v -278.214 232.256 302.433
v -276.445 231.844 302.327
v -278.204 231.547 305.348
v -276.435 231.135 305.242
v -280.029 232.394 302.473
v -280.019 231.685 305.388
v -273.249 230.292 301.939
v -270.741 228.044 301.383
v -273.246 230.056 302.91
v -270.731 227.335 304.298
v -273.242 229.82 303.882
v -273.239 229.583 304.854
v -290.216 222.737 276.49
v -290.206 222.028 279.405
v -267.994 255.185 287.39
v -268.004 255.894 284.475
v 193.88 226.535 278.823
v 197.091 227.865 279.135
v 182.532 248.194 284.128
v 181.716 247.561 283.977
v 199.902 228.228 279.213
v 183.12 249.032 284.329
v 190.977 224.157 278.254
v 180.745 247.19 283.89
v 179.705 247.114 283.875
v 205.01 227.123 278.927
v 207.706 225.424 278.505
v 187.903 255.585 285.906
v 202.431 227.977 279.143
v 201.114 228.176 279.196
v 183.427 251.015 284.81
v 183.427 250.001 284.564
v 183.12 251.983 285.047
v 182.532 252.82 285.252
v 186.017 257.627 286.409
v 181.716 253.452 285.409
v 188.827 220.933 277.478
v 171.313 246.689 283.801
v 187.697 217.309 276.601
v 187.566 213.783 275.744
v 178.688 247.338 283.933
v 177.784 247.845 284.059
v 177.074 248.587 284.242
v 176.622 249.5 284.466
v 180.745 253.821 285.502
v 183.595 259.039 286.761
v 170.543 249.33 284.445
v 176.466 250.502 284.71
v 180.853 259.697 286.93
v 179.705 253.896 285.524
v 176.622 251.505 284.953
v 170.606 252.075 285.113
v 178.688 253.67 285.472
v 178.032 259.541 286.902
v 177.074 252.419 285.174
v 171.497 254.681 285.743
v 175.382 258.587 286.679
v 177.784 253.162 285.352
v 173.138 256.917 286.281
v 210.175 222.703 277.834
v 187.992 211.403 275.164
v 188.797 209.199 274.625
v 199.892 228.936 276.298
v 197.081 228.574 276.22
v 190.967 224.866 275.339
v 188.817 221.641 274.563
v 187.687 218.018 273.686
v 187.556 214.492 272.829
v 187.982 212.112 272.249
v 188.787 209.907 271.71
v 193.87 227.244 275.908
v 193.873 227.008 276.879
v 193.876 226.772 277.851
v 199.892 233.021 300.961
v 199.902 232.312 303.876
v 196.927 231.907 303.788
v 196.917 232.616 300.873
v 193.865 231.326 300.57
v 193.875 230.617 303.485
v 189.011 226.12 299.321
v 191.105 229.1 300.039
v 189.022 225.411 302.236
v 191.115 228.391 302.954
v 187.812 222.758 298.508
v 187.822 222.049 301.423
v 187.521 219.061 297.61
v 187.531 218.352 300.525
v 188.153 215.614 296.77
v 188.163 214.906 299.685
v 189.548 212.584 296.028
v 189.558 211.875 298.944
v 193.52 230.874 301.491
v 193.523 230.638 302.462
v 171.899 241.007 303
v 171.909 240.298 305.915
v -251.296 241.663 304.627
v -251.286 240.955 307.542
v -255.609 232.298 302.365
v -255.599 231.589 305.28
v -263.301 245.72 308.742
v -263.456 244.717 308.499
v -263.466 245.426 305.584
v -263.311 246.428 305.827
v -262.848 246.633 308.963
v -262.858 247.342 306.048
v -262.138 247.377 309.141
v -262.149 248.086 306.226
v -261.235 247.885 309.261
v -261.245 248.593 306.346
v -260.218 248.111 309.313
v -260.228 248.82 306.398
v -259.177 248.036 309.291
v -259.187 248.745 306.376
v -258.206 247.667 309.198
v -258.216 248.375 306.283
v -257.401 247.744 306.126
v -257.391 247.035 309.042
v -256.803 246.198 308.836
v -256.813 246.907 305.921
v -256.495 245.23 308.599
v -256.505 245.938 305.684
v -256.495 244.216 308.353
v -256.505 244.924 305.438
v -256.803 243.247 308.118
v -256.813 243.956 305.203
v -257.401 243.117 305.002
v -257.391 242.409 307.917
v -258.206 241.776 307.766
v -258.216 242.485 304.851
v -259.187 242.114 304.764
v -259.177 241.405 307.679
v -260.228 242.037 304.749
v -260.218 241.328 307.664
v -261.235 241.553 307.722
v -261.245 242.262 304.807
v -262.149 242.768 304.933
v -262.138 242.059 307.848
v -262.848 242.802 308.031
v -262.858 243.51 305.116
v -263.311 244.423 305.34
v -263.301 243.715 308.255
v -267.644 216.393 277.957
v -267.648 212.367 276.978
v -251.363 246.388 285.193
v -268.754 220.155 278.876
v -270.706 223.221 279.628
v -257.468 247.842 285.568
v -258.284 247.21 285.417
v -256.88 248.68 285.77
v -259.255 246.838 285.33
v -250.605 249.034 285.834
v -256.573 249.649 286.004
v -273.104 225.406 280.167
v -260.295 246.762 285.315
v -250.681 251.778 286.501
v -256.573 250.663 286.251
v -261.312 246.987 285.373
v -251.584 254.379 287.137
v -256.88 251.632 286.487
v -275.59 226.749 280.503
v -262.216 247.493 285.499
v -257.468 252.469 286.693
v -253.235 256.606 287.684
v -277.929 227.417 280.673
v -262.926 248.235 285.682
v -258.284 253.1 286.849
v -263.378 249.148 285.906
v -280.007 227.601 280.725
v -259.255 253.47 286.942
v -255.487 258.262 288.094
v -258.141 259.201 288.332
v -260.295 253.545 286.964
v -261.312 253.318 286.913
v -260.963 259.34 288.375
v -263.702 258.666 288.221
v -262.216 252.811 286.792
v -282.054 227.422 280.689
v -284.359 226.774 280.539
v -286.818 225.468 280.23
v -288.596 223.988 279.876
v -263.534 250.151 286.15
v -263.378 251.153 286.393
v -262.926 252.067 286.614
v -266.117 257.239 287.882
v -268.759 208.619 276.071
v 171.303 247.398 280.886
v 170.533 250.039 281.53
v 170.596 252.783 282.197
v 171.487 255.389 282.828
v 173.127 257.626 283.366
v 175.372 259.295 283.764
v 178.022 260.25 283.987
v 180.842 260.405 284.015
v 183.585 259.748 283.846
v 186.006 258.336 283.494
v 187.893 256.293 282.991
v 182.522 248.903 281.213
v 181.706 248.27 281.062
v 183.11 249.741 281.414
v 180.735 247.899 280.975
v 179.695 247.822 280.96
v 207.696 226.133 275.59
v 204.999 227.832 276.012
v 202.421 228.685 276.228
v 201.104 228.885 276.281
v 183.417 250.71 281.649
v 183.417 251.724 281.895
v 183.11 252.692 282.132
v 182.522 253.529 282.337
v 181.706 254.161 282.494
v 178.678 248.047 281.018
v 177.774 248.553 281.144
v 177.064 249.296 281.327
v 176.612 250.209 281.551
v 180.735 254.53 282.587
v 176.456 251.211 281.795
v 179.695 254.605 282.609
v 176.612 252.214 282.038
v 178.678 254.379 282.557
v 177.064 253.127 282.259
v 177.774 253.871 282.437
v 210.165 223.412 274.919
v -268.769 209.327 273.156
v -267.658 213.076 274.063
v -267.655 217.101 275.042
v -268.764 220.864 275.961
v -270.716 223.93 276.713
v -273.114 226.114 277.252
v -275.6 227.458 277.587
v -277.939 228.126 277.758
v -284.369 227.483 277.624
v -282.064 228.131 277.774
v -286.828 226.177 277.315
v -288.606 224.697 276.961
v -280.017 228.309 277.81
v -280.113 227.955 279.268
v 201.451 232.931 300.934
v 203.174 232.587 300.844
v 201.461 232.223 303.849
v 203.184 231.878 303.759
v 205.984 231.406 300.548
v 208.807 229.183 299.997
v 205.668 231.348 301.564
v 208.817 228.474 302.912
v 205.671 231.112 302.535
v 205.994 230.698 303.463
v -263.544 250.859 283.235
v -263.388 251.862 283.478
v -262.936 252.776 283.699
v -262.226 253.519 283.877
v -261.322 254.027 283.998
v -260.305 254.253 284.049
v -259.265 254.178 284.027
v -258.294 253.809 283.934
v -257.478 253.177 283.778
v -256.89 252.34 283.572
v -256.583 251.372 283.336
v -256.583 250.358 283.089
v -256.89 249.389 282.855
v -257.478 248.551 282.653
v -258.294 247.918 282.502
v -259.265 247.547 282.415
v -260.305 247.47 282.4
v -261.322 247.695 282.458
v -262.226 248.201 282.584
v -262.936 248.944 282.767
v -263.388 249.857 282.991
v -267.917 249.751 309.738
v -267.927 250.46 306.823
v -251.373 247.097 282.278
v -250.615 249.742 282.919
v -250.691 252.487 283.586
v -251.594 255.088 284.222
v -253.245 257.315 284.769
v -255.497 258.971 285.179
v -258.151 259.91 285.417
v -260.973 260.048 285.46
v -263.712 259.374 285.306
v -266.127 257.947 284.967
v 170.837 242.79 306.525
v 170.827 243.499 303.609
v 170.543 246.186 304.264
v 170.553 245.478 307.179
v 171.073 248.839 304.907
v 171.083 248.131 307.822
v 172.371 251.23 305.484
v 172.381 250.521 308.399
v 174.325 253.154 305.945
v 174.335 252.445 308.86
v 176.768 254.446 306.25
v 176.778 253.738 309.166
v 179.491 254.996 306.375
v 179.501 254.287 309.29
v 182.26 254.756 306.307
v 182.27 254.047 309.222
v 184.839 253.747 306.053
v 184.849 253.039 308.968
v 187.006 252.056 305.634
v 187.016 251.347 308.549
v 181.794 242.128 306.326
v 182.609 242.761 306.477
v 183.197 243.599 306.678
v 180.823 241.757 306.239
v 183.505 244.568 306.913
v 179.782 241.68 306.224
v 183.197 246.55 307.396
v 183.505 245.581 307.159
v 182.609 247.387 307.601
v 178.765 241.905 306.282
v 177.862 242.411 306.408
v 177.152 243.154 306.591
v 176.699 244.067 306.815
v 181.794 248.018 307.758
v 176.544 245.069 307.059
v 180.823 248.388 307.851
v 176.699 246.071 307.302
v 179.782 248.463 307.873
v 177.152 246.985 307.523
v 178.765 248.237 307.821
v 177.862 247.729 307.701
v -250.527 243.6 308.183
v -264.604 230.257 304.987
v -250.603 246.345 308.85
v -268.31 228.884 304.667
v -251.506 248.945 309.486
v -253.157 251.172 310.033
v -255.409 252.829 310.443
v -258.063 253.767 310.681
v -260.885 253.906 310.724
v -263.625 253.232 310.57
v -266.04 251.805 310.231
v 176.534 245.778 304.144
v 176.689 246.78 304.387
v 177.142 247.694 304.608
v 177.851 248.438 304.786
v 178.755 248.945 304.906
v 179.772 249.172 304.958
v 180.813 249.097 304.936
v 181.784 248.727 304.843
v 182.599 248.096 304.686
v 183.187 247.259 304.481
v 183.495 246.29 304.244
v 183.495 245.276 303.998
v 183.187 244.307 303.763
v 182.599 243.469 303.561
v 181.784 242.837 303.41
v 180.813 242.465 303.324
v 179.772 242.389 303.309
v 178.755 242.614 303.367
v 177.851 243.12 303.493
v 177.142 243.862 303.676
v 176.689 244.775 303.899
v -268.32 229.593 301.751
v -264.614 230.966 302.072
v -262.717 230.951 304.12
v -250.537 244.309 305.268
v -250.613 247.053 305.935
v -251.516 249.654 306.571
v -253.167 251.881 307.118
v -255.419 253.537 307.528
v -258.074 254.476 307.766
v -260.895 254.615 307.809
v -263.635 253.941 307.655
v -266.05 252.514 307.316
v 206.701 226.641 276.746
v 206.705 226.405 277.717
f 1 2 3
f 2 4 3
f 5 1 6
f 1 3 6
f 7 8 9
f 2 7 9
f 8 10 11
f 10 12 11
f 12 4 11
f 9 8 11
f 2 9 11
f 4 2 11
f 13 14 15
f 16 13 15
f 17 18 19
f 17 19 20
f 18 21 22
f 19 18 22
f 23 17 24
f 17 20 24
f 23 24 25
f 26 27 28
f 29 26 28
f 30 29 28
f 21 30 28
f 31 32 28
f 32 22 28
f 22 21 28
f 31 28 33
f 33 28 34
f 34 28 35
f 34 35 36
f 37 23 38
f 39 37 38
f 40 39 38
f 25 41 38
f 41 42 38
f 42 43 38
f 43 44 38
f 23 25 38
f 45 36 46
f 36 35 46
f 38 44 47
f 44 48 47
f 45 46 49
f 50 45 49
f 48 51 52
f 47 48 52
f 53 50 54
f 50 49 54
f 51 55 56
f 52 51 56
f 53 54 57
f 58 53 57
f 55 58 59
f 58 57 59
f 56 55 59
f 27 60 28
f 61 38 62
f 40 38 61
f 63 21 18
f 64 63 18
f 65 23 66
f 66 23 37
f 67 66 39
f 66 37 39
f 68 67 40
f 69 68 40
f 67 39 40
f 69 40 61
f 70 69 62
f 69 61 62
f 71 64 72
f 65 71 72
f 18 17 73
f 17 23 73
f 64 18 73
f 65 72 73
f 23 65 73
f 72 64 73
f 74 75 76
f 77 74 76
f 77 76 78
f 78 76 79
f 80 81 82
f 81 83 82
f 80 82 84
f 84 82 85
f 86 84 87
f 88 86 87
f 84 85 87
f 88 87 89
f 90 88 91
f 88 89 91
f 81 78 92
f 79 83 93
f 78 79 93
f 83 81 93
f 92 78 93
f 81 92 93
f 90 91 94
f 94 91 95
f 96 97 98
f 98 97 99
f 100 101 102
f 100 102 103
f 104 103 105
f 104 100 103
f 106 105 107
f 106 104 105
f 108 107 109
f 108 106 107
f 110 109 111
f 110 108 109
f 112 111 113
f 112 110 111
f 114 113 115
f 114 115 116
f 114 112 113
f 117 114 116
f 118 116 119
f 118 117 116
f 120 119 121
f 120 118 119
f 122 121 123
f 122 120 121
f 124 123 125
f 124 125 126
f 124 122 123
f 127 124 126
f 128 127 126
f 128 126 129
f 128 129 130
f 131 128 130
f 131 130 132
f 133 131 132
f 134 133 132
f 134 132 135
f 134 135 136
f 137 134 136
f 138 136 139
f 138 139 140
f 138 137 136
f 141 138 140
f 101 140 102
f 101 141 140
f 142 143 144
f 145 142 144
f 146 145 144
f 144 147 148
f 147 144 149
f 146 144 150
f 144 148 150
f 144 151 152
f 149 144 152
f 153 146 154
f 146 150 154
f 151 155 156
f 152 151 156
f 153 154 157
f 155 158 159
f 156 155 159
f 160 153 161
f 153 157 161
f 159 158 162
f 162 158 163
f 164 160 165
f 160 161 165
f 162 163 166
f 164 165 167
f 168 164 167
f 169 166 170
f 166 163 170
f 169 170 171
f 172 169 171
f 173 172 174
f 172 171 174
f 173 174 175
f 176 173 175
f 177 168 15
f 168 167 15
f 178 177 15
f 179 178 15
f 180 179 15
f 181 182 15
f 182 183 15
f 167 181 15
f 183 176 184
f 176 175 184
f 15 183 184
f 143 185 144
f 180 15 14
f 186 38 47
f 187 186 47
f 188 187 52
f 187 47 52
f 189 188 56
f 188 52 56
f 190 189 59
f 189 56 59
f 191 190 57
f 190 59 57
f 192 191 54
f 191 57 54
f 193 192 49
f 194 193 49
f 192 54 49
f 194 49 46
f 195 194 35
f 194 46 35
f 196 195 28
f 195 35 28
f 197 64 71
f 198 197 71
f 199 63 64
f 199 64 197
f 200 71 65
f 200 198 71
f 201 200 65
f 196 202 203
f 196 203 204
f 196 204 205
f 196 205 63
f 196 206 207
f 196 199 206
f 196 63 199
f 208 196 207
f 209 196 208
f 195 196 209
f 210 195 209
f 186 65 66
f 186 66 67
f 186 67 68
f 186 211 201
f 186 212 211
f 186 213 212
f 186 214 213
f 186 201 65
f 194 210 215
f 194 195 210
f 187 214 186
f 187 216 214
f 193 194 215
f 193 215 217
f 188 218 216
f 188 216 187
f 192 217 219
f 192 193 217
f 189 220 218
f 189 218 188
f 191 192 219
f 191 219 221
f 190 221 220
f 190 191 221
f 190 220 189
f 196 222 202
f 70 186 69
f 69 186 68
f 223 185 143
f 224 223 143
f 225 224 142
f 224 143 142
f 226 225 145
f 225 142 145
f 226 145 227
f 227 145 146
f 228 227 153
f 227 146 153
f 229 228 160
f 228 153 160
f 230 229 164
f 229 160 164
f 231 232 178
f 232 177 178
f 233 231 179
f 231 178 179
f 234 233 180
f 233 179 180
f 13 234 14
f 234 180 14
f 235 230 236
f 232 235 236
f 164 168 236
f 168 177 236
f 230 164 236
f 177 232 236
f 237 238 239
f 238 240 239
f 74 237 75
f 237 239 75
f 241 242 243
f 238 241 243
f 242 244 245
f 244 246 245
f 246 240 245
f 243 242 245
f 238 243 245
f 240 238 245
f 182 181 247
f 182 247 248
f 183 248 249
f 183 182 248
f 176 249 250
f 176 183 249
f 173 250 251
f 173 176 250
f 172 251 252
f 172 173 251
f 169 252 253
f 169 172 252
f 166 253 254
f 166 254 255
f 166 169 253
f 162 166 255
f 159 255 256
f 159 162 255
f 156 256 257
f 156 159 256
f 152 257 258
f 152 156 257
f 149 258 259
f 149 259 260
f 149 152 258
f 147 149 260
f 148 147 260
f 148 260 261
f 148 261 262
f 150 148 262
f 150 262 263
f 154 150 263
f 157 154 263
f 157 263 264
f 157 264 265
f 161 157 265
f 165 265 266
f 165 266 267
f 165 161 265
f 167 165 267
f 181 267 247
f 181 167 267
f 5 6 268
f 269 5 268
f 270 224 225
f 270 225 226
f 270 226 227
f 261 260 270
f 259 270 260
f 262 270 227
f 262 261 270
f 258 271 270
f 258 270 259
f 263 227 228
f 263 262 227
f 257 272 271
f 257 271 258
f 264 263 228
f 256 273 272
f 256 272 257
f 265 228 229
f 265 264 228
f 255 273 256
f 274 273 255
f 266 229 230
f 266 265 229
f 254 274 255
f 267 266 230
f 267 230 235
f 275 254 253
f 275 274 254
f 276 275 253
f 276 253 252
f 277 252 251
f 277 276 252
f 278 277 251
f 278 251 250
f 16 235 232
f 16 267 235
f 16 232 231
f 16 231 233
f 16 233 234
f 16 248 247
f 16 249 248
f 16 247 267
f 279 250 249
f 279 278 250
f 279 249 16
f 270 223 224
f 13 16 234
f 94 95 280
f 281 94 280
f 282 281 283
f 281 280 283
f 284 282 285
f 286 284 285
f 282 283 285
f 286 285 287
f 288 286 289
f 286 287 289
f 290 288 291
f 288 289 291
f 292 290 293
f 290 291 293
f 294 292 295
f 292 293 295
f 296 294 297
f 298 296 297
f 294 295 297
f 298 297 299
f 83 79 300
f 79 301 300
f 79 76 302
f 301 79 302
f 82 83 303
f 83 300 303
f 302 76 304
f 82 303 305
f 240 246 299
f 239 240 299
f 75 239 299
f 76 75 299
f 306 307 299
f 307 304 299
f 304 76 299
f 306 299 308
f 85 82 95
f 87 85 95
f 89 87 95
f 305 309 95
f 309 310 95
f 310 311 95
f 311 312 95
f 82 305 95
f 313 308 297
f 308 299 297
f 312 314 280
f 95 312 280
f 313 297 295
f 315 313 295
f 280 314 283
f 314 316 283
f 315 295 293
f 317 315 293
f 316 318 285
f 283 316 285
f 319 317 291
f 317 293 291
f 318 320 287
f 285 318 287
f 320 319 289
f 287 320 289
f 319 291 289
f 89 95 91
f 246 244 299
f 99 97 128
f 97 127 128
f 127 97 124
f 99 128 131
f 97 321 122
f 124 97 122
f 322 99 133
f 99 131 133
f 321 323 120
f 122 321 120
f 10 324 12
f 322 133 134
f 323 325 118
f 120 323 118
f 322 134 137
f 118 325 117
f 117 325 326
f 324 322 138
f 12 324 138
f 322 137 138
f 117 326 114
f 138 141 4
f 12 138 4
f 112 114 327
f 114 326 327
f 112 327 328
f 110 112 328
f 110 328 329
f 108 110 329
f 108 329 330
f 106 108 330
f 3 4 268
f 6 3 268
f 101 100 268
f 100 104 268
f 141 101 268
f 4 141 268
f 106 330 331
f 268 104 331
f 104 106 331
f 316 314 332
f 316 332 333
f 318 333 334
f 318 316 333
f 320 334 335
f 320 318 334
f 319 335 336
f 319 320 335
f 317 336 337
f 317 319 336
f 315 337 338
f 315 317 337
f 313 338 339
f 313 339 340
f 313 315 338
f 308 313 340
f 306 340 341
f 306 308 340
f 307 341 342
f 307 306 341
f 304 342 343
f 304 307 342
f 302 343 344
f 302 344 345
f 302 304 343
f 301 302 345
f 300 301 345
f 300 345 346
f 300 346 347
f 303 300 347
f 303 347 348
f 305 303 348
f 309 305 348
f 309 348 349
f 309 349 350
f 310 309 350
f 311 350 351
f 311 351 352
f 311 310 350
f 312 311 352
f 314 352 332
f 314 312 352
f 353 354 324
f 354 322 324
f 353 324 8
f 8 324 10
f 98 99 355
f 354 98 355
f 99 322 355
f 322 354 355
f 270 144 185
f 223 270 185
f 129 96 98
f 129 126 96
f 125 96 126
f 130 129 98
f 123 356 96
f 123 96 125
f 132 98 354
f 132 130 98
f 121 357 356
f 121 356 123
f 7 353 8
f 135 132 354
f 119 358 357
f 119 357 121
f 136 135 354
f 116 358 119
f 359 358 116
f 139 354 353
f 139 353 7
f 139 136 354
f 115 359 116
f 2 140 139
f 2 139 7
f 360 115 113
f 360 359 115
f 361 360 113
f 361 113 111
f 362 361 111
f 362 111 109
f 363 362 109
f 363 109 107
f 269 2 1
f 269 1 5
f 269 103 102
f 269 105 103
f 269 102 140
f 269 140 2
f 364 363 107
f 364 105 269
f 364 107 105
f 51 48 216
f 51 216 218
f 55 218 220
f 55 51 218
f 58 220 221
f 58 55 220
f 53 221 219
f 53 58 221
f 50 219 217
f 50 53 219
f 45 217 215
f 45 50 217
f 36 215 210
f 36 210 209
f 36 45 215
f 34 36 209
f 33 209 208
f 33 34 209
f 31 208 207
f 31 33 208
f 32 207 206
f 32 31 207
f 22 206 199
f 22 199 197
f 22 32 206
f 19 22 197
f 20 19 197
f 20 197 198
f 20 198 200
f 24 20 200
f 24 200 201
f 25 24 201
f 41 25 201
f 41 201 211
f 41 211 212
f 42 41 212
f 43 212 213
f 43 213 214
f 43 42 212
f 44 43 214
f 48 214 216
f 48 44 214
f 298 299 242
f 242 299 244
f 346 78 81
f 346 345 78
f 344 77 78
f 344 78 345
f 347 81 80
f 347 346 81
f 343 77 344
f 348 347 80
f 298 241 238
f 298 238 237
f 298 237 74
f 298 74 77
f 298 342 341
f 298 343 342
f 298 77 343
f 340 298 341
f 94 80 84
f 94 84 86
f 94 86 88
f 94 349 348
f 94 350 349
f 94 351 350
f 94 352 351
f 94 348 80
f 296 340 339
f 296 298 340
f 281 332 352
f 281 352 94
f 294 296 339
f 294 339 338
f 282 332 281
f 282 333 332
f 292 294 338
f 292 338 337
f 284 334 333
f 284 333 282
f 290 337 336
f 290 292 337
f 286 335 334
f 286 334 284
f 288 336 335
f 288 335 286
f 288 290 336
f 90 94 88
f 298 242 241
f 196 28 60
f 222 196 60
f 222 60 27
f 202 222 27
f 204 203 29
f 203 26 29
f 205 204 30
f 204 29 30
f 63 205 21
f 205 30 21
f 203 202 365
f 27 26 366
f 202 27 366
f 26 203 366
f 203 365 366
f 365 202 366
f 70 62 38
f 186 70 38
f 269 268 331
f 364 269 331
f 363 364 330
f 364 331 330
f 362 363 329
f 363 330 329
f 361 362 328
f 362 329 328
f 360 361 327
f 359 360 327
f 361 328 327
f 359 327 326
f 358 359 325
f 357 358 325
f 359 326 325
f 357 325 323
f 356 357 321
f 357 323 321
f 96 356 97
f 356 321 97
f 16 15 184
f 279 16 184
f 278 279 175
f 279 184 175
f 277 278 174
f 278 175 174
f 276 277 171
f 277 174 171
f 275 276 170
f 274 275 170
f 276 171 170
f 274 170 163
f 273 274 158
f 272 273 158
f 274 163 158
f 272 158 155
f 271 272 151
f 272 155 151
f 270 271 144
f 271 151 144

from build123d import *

# Parameters (mm, degrees)
SZKIC1_R                      = 3.5
DODANIE_WYCI_GNI_CIE1_DEPTH   = 3
DODANIE_WYCI_GNI_CIE1_2_DEPTH = 3
SZKIC2_R                      = 3.5
DODANIE_WYCI_GNI_CIE2_DEPTH   = 3
DODANIE_WYCI_GNI_CIE2_2_DEPTH = 3


with BuildPart() as part:
    # Szkic1 → Dodanie-wyciągnięcie1 (new body)
    with BuildSketch(Plane(origin=(0.734765672, -51.515766997, 211.89173064), x_dir=(-0.999994323, -0.000796009, 0.003274099), z_dir=(-0.003369474, 0.236239983, -0.971688899))):
        with BuildLine():
            Line((-187.169292625, 315.892999472), (-209.441296402, 282.035694004))
            add(Edge.make_bspline(
                [(-209.441296402, 282.035694004), (-206.775889814, 286.087573931), (-202.858683854, 287.758514493), (-199.168709849, 287.729320466)],
                knots=[0.829057948, 0.829057948, 0.829057948, 0.829057948, 1, 1, 1, 1], degree=3, weights=[0.550001273, 0.622077689, 0.772077264, 1]))
            add(Edge.make_bspline(
                [(-199.168709849, 287.729320466), (-190.501196179, 287.660745558), (-182.83338324, 279.699846229), (-188.063141669, 268.154847974)],
                knots=[0, 0, 0, 0, 0.307110013, 0.307110013, 0.307110013, 0.307110013], degree=3, weights=[1, 0.590519983, 0.432550792, 0.526092429]))
            Line((-188.063141669, 268.154847974), (-170.579009164, 306.752095248))
            ThreePointArc((-170.579009164, 306.752095248), (-174.648073701, 318.992665858), (-187.169292625, 315.892999472))
        make_face()
        with Locations((-179.232557038, 310.672058156)):
            Circle(SZKIC1_R, mode=Mode.SUBTRACT)
    extrude(amount=DODANIE_WYCI_GNI_CIE1_DEPTH)


with BuildPart() as body_2:
    # Szkic1 → Dodanie-wyci_gni_cie1 2 (new body)
    with BuildSketch(Plane(origin=(0.734765672, -51.515766997, 211.89173064), x_dir=(-0.999994323, -0.000796009, 0.003274099), z_dir=(-0.003369474, 0.236239983, -0.971688899))):
        with BuildLine():
            Line((252.09924571, 306.788563701), (269.495020667, 267.932859656))
            add(Edge.make_bspline(
                [(269.495020667, 267.932859656), (264.273580193, 279.595619508), (272.100198145, 287.545932005), (280.843848292, 287.476754726), (284.489311538, 287.447912856), (288.334102265, 285.754708593), (290.942104385, 281.750260367)],
                knots=[0.191302656, 0.191302656, 0.191302656, 0.191302656, 0.5, 0.5, 0.5, 0.669345632, 0.669345632, 0.669345632, 0.669345632], degree=3, weights=[0.527563025, 0.43092455, 0.588403542, 1, 0.774205824, 0.624886162, 0.552041016]))
            Line((290.942104385, 281.750260367), (268.730509404, 315.854980385))
            ThreePointArc((268.730509404, 315.854980385), (256.222848494, 319.011551058), (252.09924571, 306.788563701))
        make_face()
        with Locations((260.769940721, 310.670450874)):
            Circle(SZKIC1_R, mode=Mode.SUBTRACT)
    extrude(amount=DODANIE_WYCI_GNI_CIE1_2_DEPTH)


with BuildPart() as body_3:
    # Szkic2 → Dodanie-wyciągnięcie2 (new body)
    with BuildSketch(Plane(origin=(0.81226357, -56.949286615, 234.240575322), x_dir=(-0.999994323, -0.000796009, 0.003274099), z_dir=(-0.003369474, 0.236239983, -0.971688899))):
        with BuildLine():
            Line((-188.747219403, 276.500756835), (-171.097513803, 305.765830321))
            ThreePointArc((-171.097513803, 305.765830321), (-173.52348431, 318.265245141), (-186.204954965, 317.12462874))
            Line((-186.204954965, 317.12462874), (-208.005783592, 293.567497463))
            add(Edge.make_bspline(
                [(-208.005783592, 293.567497463), (-205.389239731, 296.394833446), (-202.143001596, 297.548854487), (-199.091211511, 297.52470959)],
                knots=[0.852820792, 0.852820792, 0.852820792, 0.852820792, 1, 1, 1, 1], degree=3, weights=[0.584576923, 0.665286698, 0.803761057, 1]))
            add(Edge.make_bspline(
                [(-199.091211511, 297.52470959), (-189.609209552, 297.449690681), (-181.643640554, 288.279239816), (-188.747219403, 276.500756835)],
                knots=[0, 0, 0, 0, 0.323520489, 0.323520489, 0.323520489, 0.323520489], degree=3, weights=[1, 0.568639348, 0.416386714, 0.543242099]))
        make_face()
        with Locations((-179.232557038, 310.672058156)):
            Circle(SZKIC2_R, mode=Mode.SUBTRACT)
    extrude(amount=DODANIE_WYCI_GNI_CIE2_DEPTH)


with BuildPart() as body_4:
    # Szkic2 → Dodanie-wyci_gni_cie2 2 (new body)
    with BuildSketch(Plane(origin=(0.81226357, -56.949286615, 234.240575322), x_dir=(-0.999994323, -0.000796009, 0.003274099), z_dir=(-0.003369474, 0.236239983, -0.971688899))):
        with BuildLine():
            add(Edge.make_bspline(
                [(271.544805537, 292.788325972), (273.893649928, 295.613268937), (277.150282954, 297.273295896), (280.832835711, 297.272503503)],
                knots=[0, 0, 0, 0, 0.553776247, 0.553776247, 0.553776247, 0.553776247], degree=3, weights=[1, 0.900443837, 0.856019513, 0.866727027]))
            Line((280.832835711, 297.272503503), (268.730509404, 315.854980385))
            ThreePointArc((268.730509404, 315.854980385), (256.222848494, 319.011551058), (252.09924571, 306.788563701))
            Line((252.09924571, 306.788563701), (256.412722699, 297.153857246))
            add(Edge.make_bspline(
                [(256.412722699, 297.153857246), (263.894698689, 296.768653735), (268.903557196, 295.098621506), (271.544805537, 292.788325972)],
                knots=[0.850046497, 0.850046497, 0.850046497, 0.850046497, 1, 1, 1, 1], degree=3, weights=[0.677755948, 0.73915615, 0.846570834, 1]))
        make_face()
        with Locations((260.769940721, 310.670450874)):
            Circle(SZKIC2_R, mode=Mode.SUBTRACT)
    extrude(amount=DODANIE_WYCI_GNI_CIE2_2_DEPTH)


solid = Compound([part.part, body_2.part, body_3.part, body_4.part])
